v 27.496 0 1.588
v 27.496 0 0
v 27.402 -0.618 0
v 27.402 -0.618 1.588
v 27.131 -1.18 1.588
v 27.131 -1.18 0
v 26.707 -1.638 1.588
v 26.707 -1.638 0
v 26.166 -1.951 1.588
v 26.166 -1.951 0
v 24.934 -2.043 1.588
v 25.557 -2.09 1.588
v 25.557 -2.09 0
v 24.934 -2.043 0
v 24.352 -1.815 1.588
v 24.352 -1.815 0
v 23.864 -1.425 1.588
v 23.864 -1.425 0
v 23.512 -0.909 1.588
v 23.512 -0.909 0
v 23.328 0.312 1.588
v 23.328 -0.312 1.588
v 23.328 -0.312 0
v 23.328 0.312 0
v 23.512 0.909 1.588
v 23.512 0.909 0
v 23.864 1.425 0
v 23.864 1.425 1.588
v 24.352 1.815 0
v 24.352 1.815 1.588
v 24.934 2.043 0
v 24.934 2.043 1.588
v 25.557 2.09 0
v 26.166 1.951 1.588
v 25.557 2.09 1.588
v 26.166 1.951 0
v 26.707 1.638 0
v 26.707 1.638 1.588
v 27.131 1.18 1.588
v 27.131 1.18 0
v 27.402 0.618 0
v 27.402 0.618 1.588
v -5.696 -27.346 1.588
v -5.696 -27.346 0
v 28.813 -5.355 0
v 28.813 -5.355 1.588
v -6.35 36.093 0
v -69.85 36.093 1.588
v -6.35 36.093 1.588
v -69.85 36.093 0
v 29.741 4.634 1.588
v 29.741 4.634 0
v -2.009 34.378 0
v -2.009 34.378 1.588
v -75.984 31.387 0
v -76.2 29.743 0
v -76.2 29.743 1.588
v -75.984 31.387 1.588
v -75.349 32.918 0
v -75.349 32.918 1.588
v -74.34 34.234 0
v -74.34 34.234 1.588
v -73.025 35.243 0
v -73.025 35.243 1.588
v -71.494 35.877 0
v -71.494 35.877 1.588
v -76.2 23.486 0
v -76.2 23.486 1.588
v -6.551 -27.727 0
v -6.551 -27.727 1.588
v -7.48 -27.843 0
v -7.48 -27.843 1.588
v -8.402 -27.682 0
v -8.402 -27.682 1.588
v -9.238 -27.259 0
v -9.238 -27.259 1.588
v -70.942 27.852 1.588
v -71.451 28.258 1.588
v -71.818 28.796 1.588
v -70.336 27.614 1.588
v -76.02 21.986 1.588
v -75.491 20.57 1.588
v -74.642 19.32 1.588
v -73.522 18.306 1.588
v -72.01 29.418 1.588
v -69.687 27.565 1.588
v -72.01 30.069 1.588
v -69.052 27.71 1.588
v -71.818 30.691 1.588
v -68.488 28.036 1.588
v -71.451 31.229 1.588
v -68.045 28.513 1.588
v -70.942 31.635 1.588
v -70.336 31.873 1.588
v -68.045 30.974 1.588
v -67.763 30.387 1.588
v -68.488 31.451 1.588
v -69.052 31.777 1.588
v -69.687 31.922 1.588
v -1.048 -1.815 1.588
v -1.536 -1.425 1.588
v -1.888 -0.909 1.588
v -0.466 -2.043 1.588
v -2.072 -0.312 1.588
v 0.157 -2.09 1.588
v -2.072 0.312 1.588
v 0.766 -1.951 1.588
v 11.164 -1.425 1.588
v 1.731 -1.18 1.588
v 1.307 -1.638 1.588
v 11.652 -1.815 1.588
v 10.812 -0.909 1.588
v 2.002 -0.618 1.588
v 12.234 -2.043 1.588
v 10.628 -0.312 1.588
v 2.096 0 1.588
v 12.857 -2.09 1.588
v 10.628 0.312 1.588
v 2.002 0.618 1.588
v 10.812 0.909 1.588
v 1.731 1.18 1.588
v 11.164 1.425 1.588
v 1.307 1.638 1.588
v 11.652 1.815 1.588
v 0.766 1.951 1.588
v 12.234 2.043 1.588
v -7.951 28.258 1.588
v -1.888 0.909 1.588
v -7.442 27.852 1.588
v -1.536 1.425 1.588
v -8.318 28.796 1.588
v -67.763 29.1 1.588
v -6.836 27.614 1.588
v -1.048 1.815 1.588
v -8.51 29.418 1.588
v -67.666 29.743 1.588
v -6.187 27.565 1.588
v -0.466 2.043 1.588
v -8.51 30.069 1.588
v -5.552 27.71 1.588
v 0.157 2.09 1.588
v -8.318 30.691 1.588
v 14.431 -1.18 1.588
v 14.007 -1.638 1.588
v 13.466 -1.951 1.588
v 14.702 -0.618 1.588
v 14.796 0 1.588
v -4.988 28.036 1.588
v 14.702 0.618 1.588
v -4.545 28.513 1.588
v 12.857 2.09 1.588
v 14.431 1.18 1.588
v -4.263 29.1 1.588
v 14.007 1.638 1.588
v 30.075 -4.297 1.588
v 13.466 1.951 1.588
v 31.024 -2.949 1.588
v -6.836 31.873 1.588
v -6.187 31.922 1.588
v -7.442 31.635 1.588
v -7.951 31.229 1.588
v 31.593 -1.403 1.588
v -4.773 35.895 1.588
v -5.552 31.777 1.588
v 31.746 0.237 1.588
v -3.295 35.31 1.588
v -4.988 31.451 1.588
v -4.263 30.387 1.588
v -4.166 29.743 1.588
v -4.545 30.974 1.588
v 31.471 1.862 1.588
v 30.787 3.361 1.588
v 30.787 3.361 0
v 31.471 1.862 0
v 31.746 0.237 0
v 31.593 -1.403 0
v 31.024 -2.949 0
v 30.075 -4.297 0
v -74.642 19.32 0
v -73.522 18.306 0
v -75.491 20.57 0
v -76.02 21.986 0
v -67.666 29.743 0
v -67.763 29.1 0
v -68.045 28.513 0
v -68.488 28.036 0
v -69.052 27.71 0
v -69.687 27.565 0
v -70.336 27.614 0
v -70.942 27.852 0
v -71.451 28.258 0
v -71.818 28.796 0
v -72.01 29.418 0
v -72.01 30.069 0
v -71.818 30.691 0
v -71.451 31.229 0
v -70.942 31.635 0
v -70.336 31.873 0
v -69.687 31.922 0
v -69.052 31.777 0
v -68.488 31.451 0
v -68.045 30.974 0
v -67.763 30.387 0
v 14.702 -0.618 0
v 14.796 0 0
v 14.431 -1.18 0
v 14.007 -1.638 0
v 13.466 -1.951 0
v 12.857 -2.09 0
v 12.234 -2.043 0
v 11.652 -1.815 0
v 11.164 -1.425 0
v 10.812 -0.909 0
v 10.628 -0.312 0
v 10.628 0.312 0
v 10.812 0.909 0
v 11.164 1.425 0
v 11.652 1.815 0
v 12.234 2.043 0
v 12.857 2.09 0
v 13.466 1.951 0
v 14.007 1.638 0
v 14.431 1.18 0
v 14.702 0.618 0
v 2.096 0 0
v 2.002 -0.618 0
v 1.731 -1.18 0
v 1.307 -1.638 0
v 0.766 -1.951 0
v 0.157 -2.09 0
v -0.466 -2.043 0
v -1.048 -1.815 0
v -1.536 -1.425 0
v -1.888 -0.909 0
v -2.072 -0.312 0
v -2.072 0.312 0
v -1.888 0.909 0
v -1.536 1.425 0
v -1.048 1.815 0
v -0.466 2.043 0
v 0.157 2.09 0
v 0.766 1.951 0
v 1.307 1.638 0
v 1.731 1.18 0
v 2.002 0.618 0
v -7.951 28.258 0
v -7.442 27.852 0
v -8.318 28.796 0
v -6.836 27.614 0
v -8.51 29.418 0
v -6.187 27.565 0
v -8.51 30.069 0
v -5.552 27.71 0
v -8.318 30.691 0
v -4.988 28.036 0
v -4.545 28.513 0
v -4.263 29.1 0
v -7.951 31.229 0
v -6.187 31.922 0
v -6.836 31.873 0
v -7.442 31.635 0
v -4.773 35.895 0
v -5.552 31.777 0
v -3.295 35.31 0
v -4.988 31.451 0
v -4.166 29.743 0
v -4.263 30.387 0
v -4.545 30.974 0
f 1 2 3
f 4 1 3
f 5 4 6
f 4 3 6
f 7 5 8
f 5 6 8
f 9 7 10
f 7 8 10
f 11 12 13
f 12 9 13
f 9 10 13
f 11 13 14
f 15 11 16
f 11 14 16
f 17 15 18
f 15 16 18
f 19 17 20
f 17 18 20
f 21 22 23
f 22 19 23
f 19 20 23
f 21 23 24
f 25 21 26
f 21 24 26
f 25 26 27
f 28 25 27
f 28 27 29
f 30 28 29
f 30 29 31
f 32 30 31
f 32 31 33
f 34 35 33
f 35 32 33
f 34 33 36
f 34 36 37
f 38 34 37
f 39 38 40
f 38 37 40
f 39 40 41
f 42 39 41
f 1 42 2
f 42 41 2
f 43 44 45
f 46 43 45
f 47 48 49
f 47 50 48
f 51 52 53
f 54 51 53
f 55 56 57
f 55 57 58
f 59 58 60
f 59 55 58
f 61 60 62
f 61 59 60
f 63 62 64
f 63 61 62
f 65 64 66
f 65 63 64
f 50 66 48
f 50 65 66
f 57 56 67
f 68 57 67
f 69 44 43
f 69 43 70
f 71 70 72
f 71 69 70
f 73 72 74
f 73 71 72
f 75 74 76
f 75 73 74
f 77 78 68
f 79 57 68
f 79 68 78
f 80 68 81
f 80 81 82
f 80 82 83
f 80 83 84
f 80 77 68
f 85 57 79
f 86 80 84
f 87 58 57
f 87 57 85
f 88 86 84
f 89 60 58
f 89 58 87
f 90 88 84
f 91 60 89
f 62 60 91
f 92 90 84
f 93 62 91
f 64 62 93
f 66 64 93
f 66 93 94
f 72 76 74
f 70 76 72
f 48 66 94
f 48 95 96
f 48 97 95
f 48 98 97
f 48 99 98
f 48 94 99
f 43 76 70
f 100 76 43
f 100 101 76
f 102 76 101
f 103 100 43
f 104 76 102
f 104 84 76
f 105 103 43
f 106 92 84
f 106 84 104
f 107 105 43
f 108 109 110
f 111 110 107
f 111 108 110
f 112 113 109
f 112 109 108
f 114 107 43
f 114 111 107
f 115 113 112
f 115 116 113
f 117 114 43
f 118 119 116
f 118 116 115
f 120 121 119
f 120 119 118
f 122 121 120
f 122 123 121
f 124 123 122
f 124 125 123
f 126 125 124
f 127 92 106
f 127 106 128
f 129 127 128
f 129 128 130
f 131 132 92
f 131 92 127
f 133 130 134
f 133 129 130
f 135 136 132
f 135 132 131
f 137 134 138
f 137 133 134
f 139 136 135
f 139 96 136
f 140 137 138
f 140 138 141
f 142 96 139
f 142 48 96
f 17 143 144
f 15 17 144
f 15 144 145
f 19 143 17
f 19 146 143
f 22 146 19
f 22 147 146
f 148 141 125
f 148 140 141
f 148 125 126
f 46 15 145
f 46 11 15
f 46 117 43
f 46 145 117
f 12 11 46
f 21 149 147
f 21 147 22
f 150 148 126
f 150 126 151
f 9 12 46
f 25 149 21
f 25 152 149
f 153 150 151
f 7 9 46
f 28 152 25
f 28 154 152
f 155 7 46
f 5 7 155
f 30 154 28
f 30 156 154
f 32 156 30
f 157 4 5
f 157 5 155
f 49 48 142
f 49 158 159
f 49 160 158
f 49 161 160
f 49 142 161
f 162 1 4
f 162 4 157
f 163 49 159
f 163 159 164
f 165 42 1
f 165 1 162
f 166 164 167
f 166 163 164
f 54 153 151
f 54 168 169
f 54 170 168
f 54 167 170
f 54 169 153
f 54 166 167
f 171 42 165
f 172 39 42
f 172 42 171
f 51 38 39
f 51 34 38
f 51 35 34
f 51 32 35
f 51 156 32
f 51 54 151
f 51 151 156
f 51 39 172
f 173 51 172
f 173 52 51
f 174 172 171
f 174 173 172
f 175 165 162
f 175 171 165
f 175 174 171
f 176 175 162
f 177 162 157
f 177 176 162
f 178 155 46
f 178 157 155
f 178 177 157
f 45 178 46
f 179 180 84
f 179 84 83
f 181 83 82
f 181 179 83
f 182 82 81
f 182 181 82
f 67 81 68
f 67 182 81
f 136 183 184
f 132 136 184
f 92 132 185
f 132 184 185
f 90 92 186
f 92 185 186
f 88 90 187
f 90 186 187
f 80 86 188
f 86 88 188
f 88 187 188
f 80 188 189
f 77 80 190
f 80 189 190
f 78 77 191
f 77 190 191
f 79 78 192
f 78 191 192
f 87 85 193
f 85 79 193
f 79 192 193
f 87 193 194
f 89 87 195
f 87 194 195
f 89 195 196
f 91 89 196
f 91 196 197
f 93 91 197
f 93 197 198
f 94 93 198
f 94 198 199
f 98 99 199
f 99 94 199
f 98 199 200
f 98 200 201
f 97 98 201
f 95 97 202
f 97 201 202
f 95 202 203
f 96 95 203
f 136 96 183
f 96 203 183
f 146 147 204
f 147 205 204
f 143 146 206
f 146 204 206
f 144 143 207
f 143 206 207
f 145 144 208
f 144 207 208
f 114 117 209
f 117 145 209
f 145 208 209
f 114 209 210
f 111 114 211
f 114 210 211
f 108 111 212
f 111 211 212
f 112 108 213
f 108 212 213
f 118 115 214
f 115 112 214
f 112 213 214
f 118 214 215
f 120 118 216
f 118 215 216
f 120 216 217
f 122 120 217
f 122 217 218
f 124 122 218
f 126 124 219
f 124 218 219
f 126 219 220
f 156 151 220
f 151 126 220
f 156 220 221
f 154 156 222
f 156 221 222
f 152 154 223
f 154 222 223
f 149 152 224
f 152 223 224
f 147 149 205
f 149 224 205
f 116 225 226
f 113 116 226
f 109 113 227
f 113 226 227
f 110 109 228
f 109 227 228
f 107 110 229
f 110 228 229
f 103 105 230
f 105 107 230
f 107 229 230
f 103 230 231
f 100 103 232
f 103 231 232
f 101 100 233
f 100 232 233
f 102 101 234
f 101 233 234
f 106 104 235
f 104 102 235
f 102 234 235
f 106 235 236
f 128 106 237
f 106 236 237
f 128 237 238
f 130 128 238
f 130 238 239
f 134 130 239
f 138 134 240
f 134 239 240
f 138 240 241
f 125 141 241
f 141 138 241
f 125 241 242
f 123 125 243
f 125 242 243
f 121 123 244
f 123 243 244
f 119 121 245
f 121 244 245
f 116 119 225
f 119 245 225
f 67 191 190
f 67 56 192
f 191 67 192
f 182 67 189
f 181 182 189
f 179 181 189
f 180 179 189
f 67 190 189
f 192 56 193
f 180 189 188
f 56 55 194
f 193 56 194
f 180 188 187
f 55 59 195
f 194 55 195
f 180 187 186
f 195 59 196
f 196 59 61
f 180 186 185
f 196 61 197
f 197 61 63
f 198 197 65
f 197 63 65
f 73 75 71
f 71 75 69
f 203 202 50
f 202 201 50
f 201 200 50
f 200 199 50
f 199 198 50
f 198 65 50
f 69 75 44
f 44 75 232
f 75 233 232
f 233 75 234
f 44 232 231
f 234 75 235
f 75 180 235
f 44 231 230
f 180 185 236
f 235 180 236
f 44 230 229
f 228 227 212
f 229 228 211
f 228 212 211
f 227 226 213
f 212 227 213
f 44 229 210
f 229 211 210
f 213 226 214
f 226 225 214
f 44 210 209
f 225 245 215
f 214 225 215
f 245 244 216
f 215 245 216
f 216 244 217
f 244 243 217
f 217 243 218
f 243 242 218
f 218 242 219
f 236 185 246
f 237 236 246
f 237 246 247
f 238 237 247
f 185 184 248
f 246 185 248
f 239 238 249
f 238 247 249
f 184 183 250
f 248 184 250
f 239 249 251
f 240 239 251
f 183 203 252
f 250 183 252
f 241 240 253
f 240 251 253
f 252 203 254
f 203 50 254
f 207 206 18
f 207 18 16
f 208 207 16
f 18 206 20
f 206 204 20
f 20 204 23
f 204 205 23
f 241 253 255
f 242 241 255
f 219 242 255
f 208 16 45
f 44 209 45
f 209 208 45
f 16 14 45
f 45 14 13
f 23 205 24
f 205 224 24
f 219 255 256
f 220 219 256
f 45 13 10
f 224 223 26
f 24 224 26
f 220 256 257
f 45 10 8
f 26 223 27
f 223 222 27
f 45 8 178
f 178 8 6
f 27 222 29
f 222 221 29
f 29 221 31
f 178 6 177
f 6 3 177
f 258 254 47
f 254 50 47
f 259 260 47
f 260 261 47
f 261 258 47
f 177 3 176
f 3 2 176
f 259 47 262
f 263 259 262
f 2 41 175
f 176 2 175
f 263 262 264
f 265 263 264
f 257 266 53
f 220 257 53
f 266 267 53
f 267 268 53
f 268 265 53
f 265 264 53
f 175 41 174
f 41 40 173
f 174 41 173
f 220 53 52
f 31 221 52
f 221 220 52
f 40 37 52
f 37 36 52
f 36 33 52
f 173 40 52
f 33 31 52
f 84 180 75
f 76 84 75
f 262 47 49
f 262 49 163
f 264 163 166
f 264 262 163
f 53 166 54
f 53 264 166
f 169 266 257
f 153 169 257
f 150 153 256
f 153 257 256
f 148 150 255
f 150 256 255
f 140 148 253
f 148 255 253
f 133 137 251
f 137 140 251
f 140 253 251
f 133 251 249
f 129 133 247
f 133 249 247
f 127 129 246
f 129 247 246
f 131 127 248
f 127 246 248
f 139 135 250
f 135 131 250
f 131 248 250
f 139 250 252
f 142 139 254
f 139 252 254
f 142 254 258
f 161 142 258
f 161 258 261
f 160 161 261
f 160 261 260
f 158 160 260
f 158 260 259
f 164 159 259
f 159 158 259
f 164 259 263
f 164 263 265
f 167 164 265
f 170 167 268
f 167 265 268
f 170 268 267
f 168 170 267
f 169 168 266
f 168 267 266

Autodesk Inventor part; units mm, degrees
ref_plane "YZ Plane" through (0, 0, 0) normal (1, 0, 0) x (0, 1, 0)
ref_plane "XZ Plane" through (0, 0, 0) normal (0, 1, 0) x (-1, 0, 0)
ref_plane "XY Plane" through (0, 0, 0) normal (0, 0, 1) x (1, 0, 0)
sketch "main" plane through (0, 0, 0) normal (0, 0, 1) x (1, 0, 0)
  line L0 (10.9249, 53.4086) -> (-34.6395, -10.8755)
  line L1 (28.7127, 49.7366) -> (28.7127, -13.7634)
  arc A0 (16.1055, 56.0866) -> (10.9249, 53.4086) centre (16.1055, 49.7366) ccw
  line L2 (22.3627, 56.0866) -> (16.1055, 56.0866)
  arc A1 (28.7127, 49.7366) -> (22.3627, 56.0866) centre (22.3627, 49.7366) ccw
  arc A2 (26.9969, -18.1047) -> (28.7127, -13.7634) centre (22.3627, -13.7634) ccw
  arc A3 (-34.6395, -10.8755) -> (-34.7267, -14.4179) centre (-32.0492, -12.7116) ccw
  line L3 (-2.7465, -49.8547) -> (26.9969, -18.1047)
  circle A4 centre (-7.3807, -45.5134) radius 2.0955
  arc A5 (-12.7358, -48.926) -> (-2.7465, -49.8547) centre (-7.3807, -45.5134) ccw
  line L4 (-34.7267, -14.4179) -> (-12.7358, -48.926)
  circle A6 centre (-7.3807, -20.1134) radius 2.0955
  circle A7 centre (22.3627, 49.7366) radius 2.1844
  circle A8 centre (22.3627, -13.7634) radius 2.1844
  circle A9 centre (-7.3807, -32.8134) radius 2.0955
  point P0 (3.7494, 2.3687)
  point P1 (14.8443, 56.0866)
  dimension "d0" = 6.35
  dimension "d1" = 4.191
  dimension "d2" = 12.7
  dimension "d3" = 3.175
  dimension "d4" = 4.3688
  dimension "d5" = 4.3688
  dimension "d6" = 4.191
  dimension "d7" = 4.191
sketch "Sketch1" plane through (0, 0, 0) normal (0, 0, 1) x (1, 0, 0)
  line L0 (-73.522, 18.3056) -> (-9.2379, -27.2588)
  line L1 (-69.85, 36.0934) -> (-6.35, 36.0934)
  arc A0 (-76.2, 23.4862) -> (-73.522, 18.3056) centre (-69.85, 23.4862) ccw
  line L2 (-76.2, 29.7434) -> (-76.2, 23.4862)
  arc A1 (-69.85, 36.0934) -> (-76.2, 29.7434) centre (-69.85, 29.7434) ccw
  arc A2 (-2.0087, 34.3776) -> (-6.35, 36.0934) centre (-6.35, 29.7434) ccw
  arc A3 (-9.2379, -27.2588) -> (-5.6956, -27.346) centre (-7.4019, -24.6685) ccw
  line L3 (29.7413, 4.6342) -> (-2.0087, 34.3776)
  circle A4 centre (25.4, 0) radius 2.0955
  arc A5 (28.8126, -5.3551) -> (29.7413, 4.6342) centre (25.4, 0) ccw
  line L4 (-5.6956, -27.346) -> (28.8126, -5.3551)
  circle A6 centre (0, 0) radius 2.0955
  circle A7 centre (-69.85, 29.7434) radius 2.1844
  circle A8 centre (-6.35, 29.7434) radius 2.1844
  circle A9 centre (12.7, 0) radius 2.0955
extrude "Extrusion1" add sketch "Sketch1" along normal blind 1.5875
properties part number "sled" material "Acetal Resin, White"
